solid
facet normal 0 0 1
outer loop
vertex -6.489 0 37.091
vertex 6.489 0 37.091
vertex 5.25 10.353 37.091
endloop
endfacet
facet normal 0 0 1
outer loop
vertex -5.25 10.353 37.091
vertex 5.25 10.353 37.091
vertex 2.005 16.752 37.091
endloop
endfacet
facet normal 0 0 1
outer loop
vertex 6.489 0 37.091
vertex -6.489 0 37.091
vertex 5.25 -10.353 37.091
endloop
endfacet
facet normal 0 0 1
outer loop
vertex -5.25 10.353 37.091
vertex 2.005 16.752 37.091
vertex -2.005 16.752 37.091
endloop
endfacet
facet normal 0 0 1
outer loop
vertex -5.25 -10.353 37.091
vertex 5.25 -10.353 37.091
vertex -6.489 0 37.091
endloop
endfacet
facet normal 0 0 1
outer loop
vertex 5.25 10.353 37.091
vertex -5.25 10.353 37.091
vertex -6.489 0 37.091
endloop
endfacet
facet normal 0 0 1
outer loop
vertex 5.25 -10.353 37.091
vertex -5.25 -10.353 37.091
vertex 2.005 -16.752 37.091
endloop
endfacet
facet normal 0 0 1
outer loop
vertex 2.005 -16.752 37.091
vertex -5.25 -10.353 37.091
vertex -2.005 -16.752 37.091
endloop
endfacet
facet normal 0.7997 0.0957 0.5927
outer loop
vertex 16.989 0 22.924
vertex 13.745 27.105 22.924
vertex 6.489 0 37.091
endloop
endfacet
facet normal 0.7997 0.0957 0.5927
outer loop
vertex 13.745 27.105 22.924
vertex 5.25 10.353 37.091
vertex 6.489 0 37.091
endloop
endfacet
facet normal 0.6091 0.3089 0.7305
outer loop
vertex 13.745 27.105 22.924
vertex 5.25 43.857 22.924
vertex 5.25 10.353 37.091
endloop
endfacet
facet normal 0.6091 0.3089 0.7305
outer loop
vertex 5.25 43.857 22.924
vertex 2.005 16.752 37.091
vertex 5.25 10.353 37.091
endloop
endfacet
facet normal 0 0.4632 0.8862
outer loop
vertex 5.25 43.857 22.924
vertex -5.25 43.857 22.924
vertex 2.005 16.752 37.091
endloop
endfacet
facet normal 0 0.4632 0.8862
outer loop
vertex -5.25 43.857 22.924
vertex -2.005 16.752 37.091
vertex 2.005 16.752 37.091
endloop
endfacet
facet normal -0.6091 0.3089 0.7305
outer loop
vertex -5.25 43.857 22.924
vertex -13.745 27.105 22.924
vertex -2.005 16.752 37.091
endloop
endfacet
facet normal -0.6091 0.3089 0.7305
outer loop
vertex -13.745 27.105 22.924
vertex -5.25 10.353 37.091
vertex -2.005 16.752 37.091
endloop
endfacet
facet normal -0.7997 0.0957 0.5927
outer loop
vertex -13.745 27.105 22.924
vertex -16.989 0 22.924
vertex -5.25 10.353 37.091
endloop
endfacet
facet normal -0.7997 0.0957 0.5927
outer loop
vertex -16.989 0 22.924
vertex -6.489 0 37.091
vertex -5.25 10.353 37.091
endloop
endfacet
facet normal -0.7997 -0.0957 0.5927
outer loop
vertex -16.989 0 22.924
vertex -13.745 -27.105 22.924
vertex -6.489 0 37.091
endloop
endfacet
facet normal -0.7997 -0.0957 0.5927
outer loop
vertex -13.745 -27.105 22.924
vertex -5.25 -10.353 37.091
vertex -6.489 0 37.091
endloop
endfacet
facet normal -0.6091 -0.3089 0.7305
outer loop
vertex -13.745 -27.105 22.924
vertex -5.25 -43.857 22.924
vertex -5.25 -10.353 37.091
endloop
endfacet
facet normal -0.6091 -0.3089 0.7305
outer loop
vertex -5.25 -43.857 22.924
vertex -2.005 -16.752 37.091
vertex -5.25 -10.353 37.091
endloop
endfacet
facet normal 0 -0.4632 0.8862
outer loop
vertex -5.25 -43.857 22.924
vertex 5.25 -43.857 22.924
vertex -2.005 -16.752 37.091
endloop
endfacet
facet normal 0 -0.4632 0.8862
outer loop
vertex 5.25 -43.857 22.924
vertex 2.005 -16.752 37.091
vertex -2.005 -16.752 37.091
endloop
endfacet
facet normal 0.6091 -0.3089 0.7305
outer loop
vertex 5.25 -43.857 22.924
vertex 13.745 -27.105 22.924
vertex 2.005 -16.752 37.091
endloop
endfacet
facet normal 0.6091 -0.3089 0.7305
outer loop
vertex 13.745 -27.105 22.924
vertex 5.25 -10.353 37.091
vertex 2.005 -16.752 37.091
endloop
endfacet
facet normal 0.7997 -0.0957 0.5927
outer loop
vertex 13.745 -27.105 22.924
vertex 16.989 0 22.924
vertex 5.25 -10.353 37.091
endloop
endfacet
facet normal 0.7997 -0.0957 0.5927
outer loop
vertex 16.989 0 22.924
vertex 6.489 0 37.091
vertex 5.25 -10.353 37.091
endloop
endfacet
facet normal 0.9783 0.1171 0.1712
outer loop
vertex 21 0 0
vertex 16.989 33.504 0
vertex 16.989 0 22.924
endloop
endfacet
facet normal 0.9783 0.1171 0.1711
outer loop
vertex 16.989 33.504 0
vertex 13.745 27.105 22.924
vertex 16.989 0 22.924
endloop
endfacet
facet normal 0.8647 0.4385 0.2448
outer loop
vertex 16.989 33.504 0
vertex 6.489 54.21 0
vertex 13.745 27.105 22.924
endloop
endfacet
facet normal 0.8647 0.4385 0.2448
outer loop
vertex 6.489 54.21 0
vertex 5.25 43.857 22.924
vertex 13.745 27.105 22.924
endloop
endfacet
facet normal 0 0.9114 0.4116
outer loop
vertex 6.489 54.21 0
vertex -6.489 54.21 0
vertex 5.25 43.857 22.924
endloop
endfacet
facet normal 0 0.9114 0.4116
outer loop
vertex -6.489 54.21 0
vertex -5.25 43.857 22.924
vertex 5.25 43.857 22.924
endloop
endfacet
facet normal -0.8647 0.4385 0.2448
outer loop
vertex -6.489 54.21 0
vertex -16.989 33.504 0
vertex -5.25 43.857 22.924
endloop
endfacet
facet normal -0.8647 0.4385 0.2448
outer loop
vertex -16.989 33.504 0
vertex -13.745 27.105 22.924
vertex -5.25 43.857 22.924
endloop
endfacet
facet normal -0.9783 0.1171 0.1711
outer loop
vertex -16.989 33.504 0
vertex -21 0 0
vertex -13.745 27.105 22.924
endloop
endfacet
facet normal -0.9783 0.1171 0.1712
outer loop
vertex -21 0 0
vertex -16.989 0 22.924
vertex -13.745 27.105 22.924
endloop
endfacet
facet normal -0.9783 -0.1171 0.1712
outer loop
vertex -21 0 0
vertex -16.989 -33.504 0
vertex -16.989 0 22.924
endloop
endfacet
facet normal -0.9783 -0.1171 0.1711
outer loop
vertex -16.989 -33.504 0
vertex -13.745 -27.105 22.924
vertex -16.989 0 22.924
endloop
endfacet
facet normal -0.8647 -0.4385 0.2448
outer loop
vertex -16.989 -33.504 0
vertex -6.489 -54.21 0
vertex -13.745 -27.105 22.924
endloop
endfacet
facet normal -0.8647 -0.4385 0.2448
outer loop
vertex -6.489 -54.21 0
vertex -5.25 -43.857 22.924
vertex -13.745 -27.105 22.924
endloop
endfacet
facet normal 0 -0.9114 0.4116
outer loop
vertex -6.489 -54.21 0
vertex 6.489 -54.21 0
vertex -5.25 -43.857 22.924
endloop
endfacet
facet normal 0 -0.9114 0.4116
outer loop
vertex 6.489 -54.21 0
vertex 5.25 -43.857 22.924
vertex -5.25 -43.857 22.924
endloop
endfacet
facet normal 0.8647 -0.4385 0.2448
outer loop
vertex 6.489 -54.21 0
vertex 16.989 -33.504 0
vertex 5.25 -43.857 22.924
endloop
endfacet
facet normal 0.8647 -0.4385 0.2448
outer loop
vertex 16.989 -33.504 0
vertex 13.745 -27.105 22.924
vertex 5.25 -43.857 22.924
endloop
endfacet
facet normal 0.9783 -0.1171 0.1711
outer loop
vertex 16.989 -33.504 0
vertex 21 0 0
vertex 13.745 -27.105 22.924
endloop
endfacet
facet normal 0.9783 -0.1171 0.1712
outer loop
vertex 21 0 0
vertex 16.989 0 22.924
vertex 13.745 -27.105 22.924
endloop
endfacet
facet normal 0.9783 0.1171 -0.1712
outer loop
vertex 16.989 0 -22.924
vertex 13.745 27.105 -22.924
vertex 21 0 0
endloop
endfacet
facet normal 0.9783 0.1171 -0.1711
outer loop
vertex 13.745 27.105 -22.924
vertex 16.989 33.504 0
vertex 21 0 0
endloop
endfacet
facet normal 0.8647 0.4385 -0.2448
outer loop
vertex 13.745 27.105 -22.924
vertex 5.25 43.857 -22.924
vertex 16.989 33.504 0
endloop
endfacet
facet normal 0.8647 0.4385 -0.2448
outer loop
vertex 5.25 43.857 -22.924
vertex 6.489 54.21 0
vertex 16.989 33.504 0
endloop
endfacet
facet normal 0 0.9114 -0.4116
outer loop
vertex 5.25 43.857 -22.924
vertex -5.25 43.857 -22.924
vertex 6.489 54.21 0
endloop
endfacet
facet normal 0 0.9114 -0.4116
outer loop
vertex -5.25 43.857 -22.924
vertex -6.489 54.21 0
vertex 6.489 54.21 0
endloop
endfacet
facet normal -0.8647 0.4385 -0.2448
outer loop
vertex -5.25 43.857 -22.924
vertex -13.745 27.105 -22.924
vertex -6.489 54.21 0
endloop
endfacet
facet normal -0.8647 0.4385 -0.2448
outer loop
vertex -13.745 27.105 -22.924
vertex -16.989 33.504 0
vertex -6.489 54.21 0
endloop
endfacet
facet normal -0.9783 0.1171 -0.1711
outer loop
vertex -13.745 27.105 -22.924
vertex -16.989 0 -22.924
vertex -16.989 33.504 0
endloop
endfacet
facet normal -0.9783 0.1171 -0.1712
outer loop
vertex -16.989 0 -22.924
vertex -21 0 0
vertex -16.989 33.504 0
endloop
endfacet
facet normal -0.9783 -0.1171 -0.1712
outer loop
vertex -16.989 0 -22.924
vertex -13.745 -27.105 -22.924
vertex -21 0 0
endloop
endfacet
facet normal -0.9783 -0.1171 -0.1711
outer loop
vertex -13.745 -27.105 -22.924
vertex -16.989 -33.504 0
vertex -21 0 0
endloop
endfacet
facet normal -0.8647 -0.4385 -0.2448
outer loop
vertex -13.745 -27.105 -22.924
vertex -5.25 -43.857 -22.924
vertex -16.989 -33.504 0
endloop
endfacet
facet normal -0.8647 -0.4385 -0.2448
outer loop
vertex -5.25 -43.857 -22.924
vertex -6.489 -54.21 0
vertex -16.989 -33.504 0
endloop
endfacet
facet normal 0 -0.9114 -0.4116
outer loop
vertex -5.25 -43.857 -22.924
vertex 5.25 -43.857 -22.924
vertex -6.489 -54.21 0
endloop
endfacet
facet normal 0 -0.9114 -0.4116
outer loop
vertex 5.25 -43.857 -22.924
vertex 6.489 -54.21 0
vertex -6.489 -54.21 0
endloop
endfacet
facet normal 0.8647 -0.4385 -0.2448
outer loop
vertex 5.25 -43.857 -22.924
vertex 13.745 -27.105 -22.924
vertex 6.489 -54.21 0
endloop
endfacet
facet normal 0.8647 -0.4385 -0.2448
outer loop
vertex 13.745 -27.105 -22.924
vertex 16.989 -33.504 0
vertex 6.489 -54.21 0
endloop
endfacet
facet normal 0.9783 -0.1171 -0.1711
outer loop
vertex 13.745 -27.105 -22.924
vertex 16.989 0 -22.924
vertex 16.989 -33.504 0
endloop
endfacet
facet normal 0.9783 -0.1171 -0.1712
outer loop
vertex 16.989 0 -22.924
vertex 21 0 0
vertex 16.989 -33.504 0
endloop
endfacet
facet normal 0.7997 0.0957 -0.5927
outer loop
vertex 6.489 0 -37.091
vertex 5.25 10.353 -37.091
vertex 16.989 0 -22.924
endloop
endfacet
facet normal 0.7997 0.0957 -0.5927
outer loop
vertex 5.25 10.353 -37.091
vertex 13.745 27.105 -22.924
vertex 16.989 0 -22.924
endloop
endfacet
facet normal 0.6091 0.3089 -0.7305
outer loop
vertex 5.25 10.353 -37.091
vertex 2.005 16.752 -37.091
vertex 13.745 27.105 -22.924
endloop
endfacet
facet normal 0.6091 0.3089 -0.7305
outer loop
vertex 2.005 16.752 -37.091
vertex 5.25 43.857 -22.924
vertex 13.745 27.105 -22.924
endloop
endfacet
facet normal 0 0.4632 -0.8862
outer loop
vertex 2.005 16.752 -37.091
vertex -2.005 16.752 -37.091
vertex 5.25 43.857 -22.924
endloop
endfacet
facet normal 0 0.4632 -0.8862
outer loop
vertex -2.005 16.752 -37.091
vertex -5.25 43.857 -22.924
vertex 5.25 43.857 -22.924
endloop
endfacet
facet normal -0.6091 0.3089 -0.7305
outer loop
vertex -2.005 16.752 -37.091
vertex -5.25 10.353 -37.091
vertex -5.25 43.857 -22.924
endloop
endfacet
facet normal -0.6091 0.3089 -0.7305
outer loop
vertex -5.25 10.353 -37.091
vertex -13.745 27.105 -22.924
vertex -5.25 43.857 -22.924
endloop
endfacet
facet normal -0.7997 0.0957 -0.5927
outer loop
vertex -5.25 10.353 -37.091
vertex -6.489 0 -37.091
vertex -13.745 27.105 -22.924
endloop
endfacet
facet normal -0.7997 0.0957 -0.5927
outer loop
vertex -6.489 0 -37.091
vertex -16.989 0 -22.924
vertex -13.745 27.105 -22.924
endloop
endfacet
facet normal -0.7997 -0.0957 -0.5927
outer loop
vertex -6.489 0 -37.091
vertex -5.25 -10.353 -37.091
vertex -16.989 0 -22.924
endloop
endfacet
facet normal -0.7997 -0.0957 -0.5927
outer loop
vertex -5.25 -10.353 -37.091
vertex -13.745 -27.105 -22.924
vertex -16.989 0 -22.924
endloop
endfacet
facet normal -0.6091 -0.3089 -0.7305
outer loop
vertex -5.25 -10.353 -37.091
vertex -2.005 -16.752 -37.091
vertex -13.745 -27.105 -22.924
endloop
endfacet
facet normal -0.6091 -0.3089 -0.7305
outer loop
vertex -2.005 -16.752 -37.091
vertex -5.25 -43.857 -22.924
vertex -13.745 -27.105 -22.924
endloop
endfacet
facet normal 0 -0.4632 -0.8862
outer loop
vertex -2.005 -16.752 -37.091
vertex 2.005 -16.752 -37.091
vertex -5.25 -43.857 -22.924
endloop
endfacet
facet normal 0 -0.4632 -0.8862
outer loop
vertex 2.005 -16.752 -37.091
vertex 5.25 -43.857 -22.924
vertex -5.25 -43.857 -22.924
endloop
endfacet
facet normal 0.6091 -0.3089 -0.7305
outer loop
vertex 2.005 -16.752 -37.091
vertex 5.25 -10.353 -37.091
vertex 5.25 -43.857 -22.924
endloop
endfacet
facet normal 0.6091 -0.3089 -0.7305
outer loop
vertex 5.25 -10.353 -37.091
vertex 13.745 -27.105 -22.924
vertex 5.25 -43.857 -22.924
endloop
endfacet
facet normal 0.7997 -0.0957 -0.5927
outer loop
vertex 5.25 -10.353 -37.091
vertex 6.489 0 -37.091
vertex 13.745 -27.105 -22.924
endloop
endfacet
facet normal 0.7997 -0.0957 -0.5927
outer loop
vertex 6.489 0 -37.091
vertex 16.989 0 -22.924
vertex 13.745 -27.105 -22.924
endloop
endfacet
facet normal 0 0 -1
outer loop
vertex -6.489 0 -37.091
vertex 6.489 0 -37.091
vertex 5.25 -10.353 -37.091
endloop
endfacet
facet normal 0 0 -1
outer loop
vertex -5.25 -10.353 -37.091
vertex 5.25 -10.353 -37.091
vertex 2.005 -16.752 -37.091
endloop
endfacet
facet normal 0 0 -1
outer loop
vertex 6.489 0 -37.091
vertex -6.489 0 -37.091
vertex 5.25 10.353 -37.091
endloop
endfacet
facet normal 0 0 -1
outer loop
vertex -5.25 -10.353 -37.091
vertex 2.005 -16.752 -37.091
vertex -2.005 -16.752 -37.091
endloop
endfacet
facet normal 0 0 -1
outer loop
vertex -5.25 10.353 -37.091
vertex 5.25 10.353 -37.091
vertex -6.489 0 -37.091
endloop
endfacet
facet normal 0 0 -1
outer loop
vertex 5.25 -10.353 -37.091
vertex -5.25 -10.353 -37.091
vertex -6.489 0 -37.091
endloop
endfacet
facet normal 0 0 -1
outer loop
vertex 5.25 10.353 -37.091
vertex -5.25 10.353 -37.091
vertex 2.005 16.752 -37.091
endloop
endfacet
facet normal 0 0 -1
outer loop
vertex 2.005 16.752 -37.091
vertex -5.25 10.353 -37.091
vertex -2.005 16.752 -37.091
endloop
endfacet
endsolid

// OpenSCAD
// Generated by SolidPython 1.0.1 on 2020-07-29 00:46:48


scale(v = [7, 19, 13]) {
	sphere(r = 3);
}
/***********************************************
*********      SolidPython code:      **********
************************************************
 
# import packages: SolidPython
from solid import *
from solid.utils import *
from itertools import chain, combinations, permutations


class Resize:

    def __init__(self, scad_file):
        self.scad_file = scad_file
        #self.scad_file = import_scad(scad_file)
        # cone/cylinder param:
        self.r1 = 0
        self.r2 = 0
        self.h = 0
        # rectangular prism param:
        self.w = 0
        self.l = 0
        # ellipse param:
        self.r = 0

    # import OpenScad code (file name corresponds to shape)


    # classify shape + parameters
    def assign(self, param1, param2, param3):
        if self.scad_file == 'cone.scad':
            self.r1 = param1
            self.r2 = param2
            self.h = param3
        elif self.scad_file == 'cylinder.scad':
            self.r1 = param1
            self.r2 = param2
            self.h = param3
        elif self.scad_file == 'rectangularPrism.scad':
            self.h = param1
            self.l = param2
            self.w = param3
        else:
            self.r = param1
            self.h = param2

    # resize parameters
    def iterate(self):
        x = range(3, 20, 2)
        i = 1
        if self.scad_file == 'cone.scad':
            tempList = list(permutations(x, 2))
            for temp in tempList:
                param1 = temp[0]
                param2 = temp[1]
                filepath = 'produced_scad_files/' + 'cone' + str(param1) + '_' + str(param2) + '_' + '.scad'
                scad_render_to_file(cylinder(h=param1, r1=param2, r2=0), filepath)

        elif self.scad_file == 'cylinder.scad':
            tempList = list(permutations(x, 3))
            for temp in tempList:
                param1 = temp[0]
                param2 = temp[1]
                filepath = 'produced_scad_files/' + 'cylinder' + str(param1) + '_' + str(param2) + '_' + '.scad'
                scad_render_to_file(cylinder(h=param1, r1=param2, r2=param2), filepath)

        elif self.scad_file == 'rectangularPrism.scad':
            tempList = list(permutations(x, 3))
            for temp in tempList:
                param1 = temp[0]
                param2 = temp[1]
                param3 = temp[2]
                filepath = 'produced_scad_files/' + 'rectangularPrism' + str(param1) + '_' + str(param2) + '_' + str(
                    param3) + '.scad'
                scad_render_to_file(cube(size=(param1, param2, param3)), filepath)

        elif self.scad_file == 'ellipse.scad':
            tempList = list(permutations(x, 4))
            for temp in tempList:
                param1 = temp[0]
                param2 = temp[1]
                param3 = temp[2]
                param4 = temp[3]
                filepath = 'produced_scad_files/' + 'ellipse' + str(param1) + '_' + str(param2) + '_' + str(param3) + '_' + str(param4) + '.scad'
                scad_render_to_file(scale([param1, param2, param3])(sphere(r=param4)), filepath)

    def render_to_scadfile(self):
        scad_render_to_file(scad, 'example.scad') 
 
************************************************/
